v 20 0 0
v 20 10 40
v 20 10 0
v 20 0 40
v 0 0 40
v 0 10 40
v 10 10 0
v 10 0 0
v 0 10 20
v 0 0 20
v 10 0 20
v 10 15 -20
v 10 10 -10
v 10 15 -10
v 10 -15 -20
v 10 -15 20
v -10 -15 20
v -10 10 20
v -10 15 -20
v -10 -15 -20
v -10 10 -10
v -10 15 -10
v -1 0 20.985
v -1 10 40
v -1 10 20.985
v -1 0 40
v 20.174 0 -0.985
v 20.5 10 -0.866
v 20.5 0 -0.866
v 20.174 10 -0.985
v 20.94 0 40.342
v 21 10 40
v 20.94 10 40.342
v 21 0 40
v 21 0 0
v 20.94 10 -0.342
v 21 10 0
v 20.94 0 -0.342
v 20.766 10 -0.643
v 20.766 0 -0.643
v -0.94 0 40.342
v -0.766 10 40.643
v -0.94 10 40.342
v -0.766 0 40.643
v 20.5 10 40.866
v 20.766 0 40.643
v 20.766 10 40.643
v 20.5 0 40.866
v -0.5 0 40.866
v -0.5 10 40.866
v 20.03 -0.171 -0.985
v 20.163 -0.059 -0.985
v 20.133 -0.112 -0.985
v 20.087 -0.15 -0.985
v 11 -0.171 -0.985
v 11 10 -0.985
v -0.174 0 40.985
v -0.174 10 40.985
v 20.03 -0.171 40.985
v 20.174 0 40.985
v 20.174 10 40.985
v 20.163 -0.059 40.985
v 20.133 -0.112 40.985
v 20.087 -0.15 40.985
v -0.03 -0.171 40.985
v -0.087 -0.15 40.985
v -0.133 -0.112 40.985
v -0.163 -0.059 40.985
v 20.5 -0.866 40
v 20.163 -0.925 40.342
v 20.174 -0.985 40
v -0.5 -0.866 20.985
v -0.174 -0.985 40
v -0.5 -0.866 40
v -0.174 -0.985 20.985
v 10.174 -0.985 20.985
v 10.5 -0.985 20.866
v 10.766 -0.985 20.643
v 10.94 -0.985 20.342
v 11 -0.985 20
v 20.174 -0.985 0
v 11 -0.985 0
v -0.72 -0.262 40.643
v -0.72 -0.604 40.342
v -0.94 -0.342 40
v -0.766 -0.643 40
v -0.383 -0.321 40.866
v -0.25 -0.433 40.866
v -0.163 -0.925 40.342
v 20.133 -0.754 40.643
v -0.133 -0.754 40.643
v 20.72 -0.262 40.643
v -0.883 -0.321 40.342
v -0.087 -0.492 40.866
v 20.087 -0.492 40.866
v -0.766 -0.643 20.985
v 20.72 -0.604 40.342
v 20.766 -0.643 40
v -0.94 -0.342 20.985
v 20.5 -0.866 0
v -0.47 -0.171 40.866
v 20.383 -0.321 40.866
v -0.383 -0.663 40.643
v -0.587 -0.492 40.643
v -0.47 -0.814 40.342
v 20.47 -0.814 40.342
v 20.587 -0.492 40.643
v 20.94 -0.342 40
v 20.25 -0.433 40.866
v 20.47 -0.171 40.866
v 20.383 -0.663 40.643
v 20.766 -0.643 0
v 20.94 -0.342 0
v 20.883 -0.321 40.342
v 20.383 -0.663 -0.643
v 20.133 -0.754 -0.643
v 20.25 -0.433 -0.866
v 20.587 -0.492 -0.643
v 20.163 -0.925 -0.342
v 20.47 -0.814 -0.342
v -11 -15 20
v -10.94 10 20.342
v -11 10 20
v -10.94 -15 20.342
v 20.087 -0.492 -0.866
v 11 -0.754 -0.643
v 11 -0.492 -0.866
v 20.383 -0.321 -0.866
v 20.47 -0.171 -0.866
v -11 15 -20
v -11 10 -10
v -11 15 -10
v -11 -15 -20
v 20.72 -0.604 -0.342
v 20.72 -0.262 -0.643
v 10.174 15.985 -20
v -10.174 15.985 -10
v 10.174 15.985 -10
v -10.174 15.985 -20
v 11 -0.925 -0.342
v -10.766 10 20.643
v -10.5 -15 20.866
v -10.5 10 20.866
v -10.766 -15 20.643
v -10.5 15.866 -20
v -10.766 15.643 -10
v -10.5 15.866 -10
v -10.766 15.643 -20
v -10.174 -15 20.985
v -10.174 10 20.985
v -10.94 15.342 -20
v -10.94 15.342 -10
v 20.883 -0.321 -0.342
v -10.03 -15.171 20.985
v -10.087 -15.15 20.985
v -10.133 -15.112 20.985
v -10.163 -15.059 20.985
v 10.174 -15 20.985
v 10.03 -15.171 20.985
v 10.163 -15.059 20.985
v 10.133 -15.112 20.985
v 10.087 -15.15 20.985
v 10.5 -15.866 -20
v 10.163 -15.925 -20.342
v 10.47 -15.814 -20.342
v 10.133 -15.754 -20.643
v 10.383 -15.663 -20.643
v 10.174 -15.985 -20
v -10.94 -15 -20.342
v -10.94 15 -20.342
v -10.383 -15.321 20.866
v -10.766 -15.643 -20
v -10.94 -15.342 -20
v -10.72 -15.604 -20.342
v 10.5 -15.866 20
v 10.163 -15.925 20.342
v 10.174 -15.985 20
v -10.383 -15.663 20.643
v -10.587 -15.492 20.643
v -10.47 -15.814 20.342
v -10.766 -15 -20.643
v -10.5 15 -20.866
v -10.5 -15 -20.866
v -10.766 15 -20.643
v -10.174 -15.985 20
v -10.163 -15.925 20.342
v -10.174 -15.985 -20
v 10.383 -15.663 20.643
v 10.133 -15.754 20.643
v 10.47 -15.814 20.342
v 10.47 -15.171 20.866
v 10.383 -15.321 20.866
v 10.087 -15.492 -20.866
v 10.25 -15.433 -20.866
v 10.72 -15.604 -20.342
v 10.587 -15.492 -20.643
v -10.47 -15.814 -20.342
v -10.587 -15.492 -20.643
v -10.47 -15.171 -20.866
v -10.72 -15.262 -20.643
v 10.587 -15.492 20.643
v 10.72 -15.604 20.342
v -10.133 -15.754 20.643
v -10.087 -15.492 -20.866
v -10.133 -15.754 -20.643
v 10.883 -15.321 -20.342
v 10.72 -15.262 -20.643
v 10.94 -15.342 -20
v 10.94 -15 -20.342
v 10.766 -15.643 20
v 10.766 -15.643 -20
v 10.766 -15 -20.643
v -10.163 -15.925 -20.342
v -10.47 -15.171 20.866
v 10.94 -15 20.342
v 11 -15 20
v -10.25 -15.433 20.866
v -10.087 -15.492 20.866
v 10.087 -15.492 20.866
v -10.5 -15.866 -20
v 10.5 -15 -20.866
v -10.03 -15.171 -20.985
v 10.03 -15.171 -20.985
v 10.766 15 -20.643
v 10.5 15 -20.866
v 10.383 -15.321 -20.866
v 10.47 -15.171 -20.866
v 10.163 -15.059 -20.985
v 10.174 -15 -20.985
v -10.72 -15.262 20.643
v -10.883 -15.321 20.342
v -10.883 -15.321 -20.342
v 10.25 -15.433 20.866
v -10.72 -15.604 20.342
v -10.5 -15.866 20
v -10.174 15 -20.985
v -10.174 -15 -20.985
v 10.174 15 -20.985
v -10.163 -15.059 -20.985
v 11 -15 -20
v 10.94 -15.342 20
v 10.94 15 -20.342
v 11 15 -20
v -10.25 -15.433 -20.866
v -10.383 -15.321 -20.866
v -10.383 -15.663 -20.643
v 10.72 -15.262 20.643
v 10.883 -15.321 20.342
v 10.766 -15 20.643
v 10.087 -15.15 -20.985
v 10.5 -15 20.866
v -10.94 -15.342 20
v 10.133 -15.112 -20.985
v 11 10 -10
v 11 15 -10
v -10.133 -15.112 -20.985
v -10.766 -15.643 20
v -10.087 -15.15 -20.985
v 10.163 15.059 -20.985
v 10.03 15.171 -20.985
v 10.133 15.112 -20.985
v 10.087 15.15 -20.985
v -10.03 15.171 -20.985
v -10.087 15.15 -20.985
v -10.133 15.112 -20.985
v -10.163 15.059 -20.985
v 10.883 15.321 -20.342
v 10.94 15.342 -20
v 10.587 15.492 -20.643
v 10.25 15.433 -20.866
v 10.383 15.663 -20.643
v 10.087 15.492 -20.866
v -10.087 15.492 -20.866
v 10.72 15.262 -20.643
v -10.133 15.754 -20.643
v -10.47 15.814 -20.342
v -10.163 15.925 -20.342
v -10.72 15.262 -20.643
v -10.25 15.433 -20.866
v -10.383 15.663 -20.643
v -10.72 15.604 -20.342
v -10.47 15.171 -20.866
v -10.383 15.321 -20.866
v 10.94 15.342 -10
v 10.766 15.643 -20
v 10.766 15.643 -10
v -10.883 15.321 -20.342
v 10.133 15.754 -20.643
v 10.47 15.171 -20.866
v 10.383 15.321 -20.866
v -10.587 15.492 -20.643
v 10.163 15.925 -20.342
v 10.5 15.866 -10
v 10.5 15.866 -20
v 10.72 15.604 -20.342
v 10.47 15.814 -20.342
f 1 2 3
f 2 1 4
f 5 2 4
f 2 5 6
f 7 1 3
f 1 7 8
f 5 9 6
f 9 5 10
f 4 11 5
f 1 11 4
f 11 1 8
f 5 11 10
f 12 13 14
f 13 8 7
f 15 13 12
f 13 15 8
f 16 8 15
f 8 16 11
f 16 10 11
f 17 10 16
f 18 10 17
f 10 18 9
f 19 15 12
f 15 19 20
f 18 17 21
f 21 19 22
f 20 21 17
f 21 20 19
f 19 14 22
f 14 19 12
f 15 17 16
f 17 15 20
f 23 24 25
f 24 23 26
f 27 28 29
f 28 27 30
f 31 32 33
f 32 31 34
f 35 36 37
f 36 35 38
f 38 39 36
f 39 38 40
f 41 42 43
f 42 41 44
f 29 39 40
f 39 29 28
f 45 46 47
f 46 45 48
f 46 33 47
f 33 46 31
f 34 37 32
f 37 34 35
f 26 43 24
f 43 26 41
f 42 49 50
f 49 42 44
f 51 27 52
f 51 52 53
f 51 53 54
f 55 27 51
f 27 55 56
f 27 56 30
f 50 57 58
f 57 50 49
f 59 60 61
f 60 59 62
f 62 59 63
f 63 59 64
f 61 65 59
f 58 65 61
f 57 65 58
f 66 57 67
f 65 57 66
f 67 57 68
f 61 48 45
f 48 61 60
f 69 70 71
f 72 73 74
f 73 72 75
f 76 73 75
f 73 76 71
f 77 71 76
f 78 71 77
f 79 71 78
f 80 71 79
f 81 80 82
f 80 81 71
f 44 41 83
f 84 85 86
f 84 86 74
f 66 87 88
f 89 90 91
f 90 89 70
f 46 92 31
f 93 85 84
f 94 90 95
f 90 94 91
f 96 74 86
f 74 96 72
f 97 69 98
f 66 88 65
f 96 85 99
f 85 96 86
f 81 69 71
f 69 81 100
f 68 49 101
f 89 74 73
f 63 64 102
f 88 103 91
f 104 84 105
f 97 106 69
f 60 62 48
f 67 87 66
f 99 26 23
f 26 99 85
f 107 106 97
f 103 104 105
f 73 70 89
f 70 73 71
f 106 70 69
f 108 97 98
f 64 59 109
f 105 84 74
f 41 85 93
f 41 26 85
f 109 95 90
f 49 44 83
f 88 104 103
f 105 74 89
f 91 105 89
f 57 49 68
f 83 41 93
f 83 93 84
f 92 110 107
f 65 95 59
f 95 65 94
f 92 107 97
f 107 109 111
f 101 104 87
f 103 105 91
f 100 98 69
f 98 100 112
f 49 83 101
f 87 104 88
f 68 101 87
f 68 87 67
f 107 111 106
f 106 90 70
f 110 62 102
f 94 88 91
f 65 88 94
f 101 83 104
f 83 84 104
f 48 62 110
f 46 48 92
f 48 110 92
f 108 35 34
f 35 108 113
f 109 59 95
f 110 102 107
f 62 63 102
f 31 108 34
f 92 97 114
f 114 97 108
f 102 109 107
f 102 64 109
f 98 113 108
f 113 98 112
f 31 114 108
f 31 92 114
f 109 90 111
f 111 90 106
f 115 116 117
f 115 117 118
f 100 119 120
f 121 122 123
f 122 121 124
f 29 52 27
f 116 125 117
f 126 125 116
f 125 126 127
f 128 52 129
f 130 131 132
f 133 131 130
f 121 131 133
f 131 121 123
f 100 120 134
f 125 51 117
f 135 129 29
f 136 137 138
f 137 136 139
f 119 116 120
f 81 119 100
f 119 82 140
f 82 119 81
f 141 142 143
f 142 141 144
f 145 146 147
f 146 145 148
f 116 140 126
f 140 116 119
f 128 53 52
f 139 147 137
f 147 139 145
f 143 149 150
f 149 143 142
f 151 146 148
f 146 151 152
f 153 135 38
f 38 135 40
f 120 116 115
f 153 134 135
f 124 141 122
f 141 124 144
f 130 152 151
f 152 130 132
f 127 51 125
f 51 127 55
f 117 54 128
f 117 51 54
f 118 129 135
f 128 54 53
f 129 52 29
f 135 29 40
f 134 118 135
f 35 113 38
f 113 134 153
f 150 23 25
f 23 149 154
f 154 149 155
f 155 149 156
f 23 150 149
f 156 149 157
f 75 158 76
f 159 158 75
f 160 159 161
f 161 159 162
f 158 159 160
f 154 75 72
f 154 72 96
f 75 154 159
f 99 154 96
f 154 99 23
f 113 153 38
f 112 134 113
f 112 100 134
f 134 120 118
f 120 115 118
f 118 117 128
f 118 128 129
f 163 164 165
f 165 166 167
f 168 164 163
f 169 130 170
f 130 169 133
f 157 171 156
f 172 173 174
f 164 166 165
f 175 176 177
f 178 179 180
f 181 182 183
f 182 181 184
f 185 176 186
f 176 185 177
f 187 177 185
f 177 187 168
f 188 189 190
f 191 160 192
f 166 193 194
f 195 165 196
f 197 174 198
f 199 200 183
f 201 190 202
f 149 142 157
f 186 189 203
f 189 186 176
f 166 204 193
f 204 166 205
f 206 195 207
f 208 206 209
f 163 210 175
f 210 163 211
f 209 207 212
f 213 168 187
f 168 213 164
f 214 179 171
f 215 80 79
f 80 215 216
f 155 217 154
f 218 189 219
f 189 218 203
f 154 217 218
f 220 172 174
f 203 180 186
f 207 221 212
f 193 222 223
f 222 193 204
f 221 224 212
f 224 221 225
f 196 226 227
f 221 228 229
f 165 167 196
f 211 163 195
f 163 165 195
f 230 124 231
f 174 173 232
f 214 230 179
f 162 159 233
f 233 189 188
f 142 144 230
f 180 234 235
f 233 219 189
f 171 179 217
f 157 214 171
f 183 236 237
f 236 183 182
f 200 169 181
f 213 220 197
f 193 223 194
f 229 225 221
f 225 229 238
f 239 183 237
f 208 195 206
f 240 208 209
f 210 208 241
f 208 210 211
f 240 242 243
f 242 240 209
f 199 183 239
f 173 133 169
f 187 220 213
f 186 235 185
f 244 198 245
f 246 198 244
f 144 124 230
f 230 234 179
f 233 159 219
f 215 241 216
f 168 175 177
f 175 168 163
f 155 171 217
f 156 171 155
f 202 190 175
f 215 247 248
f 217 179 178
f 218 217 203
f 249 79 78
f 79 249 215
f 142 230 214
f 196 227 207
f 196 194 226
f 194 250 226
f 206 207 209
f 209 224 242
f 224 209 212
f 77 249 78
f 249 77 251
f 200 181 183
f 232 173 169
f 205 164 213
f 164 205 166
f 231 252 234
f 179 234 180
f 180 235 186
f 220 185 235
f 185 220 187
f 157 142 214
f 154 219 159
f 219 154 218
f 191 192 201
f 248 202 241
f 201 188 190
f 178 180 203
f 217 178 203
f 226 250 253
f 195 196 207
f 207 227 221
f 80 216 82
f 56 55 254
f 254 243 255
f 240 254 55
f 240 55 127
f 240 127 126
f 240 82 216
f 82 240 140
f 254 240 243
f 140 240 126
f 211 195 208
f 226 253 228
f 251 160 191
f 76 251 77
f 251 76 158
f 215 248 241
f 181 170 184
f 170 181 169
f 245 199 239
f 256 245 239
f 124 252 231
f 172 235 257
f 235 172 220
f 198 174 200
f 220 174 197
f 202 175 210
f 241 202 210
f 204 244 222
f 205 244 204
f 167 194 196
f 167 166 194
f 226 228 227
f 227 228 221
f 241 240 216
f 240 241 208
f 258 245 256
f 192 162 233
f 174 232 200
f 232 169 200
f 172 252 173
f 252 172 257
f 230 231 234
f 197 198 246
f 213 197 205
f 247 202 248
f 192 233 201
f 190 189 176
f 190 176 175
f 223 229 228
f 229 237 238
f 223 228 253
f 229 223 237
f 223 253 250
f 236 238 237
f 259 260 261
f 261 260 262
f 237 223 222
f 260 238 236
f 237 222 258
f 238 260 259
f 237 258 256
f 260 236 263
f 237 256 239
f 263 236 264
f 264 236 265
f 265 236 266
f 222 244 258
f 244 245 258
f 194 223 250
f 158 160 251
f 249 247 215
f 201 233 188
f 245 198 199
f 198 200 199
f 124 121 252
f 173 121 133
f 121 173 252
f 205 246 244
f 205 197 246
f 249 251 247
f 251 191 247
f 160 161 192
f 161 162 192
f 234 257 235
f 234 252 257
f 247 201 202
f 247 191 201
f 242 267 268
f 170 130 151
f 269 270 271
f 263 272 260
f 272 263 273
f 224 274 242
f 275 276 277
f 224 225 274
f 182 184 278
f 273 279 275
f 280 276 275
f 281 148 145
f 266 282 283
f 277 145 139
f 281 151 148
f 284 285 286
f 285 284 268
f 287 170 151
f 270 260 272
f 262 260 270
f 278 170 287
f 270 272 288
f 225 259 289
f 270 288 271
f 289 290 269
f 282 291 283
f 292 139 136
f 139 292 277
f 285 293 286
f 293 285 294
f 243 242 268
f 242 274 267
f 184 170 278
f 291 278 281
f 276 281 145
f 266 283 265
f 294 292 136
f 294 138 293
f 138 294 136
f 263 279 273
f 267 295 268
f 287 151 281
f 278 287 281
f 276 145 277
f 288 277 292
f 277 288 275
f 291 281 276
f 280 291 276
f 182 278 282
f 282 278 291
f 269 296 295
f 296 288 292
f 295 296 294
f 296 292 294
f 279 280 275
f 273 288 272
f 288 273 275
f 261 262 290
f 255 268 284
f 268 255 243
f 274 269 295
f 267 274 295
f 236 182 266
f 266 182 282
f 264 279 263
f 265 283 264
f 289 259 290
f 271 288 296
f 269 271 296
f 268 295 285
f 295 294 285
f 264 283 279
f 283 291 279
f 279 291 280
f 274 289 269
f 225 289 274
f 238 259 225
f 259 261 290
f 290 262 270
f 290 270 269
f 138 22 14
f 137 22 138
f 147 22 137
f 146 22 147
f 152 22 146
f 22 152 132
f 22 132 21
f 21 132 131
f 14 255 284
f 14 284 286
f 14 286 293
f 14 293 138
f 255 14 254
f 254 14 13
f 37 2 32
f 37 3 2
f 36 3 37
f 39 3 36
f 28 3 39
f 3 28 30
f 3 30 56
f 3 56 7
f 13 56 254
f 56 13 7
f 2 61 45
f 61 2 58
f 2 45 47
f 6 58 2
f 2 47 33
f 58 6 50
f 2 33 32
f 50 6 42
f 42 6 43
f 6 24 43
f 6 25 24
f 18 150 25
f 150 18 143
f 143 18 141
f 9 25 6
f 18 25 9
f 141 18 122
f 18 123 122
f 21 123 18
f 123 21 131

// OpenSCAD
/* Really need a 3D offset() to do this correctly. */
module nhf_derivate_shell_out(r=undef) {
    if (r!=undef) {
        difference() {
            minkowski(convexity=9) {
                sphere(r=r);
                children();
            }
            children();
        }
    }
}

difference() {
    nhf_derivate_shell_out(r=1,$fn=18) {
        cube([20,30,40]);
        cube([20,30,40],center=true);
    }
    translate([-20,10,-10]) cube([50,50,60]);
}
